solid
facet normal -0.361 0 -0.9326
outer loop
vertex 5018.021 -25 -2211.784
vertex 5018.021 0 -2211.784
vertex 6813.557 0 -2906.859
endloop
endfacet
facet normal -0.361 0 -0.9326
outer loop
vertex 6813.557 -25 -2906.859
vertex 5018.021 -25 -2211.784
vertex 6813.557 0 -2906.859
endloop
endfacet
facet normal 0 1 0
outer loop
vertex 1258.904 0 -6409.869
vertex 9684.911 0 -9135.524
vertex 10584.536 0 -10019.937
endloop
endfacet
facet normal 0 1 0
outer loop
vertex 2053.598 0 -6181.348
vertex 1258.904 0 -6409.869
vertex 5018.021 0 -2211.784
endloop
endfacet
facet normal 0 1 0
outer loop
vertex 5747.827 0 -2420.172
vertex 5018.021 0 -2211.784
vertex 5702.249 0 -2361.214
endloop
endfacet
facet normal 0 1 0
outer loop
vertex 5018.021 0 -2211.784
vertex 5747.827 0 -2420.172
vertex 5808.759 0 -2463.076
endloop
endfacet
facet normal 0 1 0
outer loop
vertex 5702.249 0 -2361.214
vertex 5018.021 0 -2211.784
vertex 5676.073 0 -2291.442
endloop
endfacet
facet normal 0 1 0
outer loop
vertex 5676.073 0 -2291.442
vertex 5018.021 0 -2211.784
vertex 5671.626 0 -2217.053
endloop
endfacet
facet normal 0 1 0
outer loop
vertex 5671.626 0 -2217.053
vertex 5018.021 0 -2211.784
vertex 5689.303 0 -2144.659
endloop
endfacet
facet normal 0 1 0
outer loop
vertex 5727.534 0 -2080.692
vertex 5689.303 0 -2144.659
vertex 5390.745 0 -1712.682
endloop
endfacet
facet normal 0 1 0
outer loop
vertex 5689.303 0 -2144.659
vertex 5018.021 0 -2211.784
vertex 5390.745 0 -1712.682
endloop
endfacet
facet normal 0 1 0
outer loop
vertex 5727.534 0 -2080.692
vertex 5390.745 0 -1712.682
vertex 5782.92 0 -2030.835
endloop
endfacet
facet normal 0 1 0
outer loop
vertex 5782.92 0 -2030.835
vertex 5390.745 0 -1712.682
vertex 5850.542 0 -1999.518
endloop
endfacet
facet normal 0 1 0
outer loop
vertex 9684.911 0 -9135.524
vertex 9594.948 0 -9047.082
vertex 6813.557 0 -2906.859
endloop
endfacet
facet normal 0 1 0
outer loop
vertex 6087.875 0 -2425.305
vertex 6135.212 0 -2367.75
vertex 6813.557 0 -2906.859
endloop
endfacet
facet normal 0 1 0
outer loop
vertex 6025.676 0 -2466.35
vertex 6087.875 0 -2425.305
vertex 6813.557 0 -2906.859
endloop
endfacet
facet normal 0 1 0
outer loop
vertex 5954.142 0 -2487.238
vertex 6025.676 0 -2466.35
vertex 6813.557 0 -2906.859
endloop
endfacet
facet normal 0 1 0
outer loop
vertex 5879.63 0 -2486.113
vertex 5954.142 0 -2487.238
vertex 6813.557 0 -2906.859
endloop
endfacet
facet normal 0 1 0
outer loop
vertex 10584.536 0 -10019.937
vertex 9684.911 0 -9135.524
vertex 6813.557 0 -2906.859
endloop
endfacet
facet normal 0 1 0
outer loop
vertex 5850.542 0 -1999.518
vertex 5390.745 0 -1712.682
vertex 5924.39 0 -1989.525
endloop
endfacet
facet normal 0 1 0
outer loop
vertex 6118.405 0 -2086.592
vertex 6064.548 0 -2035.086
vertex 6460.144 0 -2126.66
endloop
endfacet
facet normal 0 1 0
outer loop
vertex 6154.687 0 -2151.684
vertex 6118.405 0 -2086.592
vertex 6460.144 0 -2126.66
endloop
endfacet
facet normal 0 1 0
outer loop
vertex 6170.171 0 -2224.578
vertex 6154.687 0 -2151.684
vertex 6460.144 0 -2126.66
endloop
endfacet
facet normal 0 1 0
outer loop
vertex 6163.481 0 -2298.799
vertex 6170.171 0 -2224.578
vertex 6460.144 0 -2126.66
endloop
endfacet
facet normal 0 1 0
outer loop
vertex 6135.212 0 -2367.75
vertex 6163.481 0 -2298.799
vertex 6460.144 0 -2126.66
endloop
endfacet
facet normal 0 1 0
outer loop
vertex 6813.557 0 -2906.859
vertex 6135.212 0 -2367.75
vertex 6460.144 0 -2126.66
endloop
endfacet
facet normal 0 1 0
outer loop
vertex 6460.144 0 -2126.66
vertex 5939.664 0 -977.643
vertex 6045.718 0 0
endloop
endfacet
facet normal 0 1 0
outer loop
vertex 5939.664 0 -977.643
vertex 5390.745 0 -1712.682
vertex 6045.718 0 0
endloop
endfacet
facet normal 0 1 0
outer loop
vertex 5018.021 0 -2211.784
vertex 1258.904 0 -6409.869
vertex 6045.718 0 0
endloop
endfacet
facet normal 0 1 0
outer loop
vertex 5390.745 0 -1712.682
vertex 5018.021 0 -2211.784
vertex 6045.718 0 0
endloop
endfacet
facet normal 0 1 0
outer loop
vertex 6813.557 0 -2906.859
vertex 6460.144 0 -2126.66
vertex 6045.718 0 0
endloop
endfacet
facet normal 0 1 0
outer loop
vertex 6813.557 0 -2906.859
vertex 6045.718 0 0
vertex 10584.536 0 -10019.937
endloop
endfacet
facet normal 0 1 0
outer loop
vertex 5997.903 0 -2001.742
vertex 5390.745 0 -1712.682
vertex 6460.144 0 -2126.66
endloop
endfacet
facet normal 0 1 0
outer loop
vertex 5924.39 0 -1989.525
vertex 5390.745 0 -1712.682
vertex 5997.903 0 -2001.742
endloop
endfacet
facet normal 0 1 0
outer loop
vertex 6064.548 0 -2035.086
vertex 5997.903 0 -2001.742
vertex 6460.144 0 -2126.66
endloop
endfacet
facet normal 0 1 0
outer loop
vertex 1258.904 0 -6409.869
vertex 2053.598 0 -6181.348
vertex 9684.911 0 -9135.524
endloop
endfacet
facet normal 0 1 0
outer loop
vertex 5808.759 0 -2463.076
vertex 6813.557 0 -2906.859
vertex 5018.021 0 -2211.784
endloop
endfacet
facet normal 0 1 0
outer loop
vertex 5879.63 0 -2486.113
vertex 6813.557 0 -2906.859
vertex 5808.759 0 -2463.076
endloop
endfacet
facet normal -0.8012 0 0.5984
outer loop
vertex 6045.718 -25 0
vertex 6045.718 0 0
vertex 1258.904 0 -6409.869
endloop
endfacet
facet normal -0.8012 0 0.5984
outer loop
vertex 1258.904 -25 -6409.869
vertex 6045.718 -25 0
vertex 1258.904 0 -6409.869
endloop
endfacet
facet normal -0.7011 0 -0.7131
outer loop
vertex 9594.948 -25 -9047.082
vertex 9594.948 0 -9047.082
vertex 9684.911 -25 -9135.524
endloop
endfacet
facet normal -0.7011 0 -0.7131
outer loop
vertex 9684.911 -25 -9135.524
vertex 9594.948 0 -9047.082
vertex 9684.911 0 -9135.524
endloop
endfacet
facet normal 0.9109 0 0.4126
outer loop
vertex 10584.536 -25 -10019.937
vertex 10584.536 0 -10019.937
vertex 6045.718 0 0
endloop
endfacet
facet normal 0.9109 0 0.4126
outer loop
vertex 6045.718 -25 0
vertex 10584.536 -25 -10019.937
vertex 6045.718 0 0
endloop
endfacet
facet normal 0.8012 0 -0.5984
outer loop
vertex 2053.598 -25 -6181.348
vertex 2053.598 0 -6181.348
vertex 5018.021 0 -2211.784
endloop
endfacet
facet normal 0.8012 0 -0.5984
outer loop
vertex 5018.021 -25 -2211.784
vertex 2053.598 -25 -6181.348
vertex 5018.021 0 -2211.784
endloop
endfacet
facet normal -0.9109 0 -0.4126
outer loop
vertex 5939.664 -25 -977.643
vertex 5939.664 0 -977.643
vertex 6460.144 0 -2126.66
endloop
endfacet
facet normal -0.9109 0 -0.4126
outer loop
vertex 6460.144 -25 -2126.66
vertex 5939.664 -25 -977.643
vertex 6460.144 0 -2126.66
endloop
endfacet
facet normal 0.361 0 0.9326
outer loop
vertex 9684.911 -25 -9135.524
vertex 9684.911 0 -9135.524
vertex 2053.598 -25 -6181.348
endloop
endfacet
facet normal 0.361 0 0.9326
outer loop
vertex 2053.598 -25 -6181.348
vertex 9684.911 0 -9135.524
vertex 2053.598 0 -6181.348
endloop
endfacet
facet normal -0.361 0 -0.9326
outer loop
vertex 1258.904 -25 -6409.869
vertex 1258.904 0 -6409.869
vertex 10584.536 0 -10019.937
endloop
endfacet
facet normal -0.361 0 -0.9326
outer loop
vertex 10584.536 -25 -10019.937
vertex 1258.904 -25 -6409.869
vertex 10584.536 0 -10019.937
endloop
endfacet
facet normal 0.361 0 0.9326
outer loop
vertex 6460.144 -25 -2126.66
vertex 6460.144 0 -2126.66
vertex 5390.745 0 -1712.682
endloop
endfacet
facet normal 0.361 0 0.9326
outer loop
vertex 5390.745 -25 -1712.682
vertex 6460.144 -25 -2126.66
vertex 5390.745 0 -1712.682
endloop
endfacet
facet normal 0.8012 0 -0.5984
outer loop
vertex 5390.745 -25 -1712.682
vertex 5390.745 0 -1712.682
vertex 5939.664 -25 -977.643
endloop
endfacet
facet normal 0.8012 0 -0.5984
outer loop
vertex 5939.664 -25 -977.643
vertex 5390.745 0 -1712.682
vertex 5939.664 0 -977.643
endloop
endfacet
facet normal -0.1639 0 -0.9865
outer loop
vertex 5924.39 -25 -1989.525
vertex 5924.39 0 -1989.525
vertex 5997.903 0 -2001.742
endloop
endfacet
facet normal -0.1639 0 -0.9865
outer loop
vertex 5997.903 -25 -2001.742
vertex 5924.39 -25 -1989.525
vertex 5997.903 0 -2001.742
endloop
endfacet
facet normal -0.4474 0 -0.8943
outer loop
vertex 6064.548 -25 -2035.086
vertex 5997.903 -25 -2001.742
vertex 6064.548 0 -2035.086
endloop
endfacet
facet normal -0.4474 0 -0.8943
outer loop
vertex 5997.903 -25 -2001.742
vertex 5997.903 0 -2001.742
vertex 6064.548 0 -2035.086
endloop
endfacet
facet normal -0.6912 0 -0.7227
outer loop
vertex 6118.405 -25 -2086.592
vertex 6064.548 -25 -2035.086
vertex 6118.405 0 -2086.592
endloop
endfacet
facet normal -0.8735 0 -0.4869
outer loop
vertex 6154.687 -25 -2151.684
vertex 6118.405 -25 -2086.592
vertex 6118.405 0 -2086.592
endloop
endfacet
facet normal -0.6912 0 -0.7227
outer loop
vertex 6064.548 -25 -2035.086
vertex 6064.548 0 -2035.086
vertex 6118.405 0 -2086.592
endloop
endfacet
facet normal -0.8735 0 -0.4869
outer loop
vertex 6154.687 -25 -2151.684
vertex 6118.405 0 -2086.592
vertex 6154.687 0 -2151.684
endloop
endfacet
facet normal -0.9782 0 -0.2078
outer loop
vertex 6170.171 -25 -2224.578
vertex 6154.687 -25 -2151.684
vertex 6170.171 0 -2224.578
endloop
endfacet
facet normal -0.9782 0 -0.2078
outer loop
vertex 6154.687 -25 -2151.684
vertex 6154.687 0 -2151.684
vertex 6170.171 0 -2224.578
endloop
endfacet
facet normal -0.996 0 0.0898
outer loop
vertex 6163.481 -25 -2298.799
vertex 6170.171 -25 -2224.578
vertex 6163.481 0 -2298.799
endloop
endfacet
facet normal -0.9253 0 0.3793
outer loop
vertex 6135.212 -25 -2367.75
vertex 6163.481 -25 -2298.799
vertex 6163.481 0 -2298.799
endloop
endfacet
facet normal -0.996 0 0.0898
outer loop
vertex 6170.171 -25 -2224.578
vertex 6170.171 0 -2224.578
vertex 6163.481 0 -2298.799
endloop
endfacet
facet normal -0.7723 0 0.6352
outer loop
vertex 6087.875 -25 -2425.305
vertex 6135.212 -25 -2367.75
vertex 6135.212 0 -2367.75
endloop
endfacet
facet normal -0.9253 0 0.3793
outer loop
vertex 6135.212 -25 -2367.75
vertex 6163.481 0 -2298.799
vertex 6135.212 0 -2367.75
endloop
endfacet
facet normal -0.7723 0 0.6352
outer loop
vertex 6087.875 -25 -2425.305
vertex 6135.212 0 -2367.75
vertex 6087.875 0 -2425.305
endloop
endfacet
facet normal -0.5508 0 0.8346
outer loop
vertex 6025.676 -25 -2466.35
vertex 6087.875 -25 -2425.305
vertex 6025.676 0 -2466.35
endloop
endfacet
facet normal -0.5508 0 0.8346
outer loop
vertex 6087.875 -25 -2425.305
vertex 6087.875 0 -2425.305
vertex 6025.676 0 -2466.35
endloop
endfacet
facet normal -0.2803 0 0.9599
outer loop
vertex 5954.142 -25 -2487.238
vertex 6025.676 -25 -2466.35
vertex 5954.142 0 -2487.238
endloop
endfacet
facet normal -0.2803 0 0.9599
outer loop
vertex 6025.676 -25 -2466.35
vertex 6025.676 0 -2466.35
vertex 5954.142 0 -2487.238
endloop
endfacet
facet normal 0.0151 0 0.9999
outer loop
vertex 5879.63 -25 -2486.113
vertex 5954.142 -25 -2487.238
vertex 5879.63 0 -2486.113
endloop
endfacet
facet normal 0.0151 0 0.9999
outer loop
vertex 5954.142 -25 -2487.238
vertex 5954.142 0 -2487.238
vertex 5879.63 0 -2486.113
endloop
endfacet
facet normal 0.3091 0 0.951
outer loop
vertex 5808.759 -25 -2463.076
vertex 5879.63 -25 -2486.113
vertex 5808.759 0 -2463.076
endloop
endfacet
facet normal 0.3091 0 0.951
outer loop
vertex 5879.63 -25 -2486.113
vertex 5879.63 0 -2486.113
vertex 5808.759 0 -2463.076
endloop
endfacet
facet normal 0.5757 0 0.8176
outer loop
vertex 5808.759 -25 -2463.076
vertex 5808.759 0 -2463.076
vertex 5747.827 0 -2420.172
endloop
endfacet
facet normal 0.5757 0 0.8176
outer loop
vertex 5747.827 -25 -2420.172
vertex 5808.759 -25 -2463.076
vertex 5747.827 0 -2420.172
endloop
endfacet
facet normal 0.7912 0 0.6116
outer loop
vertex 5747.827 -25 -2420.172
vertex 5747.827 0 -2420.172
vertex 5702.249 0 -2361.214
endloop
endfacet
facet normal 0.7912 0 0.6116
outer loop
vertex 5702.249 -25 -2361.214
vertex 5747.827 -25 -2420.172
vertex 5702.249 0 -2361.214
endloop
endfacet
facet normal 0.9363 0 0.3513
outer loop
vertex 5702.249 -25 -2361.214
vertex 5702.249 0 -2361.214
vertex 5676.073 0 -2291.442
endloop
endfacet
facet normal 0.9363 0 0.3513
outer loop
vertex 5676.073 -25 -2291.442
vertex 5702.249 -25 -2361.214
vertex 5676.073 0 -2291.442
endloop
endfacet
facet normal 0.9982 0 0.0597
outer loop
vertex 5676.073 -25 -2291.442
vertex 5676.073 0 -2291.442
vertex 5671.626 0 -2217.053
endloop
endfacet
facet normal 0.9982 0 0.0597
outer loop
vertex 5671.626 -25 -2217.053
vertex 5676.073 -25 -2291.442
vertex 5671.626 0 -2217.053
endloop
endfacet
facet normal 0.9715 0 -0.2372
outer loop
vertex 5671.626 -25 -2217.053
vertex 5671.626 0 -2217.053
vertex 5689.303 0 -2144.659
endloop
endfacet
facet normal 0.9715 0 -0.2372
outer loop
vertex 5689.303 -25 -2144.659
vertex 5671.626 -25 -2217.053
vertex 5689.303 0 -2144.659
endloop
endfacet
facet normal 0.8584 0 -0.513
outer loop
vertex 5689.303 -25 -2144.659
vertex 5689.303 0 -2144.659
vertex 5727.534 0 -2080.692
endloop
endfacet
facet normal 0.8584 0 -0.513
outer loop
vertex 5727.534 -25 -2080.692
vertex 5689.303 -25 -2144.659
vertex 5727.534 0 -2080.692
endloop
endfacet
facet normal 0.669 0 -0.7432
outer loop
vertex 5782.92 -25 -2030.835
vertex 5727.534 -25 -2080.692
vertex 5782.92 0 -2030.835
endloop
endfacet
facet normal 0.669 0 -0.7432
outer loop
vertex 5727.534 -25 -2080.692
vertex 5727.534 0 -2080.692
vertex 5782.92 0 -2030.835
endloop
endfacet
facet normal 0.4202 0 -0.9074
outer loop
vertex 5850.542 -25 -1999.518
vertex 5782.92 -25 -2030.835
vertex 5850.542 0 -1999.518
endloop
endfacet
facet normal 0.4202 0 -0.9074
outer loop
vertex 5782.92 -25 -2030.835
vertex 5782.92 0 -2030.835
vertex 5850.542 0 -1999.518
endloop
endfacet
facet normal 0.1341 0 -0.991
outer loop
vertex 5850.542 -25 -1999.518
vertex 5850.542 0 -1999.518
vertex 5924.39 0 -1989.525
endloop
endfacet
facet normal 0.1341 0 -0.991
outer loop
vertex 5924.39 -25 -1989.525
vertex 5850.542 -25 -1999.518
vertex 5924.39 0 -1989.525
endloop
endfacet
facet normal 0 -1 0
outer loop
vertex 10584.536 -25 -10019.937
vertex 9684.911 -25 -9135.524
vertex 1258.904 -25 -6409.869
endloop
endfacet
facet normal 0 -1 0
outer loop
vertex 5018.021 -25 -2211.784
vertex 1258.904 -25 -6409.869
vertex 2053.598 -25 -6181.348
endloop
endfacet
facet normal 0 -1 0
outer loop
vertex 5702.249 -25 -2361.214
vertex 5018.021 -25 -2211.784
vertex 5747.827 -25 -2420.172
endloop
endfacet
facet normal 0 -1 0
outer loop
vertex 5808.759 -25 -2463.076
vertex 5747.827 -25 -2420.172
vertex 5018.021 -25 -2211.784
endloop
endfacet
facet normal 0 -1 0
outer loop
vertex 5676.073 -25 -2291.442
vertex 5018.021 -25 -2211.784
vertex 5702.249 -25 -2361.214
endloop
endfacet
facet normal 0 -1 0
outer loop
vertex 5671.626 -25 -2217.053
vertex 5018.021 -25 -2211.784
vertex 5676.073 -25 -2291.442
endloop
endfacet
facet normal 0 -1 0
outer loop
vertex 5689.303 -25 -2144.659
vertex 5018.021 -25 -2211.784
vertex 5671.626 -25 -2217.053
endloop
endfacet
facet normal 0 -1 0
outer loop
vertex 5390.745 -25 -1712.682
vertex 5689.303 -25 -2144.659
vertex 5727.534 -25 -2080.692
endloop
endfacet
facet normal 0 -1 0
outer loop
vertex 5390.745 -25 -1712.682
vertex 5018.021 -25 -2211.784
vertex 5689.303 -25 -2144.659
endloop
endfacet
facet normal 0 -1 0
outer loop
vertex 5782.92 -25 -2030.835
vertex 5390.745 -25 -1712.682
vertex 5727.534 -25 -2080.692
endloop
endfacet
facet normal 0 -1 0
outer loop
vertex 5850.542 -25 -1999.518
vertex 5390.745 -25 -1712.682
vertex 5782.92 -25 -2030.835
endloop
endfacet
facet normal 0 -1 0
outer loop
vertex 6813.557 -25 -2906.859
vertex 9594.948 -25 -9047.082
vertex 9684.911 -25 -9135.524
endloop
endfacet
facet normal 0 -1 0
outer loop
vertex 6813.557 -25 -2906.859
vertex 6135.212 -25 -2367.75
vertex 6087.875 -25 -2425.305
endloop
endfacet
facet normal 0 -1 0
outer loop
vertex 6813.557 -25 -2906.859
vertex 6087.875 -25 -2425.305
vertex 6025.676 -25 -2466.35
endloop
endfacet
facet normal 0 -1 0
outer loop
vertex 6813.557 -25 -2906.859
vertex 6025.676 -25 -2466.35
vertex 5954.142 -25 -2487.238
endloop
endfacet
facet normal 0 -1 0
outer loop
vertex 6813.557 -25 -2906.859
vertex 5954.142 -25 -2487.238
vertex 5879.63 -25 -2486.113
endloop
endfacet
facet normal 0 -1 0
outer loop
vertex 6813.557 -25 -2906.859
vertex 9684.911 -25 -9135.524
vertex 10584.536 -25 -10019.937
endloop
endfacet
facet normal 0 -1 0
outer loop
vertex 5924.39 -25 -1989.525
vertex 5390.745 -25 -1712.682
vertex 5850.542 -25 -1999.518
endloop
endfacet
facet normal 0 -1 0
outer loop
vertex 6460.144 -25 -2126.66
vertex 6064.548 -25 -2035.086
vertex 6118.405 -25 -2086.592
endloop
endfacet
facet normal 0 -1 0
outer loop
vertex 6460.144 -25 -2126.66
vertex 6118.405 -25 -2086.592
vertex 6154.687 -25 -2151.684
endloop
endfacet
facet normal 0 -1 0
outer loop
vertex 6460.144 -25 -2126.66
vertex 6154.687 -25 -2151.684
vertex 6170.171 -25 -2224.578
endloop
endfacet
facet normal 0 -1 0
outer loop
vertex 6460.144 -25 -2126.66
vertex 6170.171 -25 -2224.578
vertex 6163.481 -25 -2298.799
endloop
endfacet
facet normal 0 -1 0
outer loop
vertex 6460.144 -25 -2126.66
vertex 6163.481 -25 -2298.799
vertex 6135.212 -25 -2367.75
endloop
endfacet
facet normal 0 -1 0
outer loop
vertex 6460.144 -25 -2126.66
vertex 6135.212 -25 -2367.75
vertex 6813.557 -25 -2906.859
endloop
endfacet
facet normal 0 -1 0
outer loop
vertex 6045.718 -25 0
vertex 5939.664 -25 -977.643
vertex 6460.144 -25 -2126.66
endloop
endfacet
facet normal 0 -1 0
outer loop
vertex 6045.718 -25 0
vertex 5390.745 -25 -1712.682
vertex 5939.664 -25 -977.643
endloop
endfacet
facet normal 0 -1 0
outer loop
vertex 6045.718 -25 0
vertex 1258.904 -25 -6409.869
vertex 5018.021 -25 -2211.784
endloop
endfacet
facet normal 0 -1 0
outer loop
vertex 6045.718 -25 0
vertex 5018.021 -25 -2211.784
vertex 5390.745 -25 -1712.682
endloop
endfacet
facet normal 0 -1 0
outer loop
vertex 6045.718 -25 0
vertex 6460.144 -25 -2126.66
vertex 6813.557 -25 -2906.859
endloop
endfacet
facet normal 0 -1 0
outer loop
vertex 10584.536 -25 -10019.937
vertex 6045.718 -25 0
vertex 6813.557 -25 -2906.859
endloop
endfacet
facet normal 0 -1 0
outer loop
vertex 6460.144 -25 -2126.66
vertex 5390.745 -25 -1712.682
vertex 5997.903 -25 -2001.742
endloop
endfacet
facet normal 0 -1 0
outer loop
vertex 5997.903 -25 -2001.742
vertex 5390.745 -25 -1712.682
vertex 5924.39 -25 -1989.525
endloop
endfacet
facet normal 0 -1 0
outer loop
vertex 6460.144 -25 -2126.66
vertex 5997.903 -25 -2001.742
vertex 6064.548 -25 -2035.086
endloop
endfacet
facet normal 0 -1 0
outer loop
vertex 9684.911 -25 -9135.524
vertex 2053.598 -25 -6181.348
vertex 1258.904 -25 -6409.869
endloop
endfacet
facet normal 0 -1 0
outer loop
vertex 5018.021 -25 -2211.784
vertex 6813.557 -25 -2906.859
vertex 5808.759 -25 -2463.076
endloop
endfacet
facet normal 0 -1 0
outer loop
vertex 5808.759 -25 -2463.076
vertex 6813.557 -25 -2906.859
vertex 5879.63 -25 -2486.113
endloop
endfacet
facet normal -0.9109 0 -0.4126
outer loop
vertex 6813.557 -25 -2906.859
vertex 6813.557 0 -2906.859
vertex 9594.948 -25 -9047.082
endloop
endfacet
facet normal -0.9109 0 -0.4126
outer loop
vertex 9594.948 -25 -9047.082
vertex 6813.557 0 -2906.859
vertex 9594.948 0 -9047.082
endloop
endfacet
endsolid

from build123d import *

# Parameters (mm, degrees)
F1_DEPTH = 25


# Not quite as in the source:
# - a feature names something its author has since deleted; it is built from what else it names


with BuildPart() as f1:
    # F0 (on Front) → F1 (new body)
    with BuildSketch(Plane.XZ):
        Polygon((5704.0546409884, -457.5102814203), (3652.3110417295, -3204.934271635), (4012.161188687, -3558.6994219099), (5018.0213600066, -2211.7843558738), (5390.744898264, -1712.6822306881), (5939.6636085267, -977.6428067571), align=None)
        Polygon((6045.7178843911, 0), (5704.0546409884, -457.5102814203), (5939.6636085267, -977.6428067571), (6281.3268519294, -520.1325253368), align=None)
        Polygon((6281.3268519294, -520.1325253368), (5939.6636085267, -977.6428067571), (6460.143900134, -2126.6598891299), (6813.5573514414, -2906.8586771351), (7811.482530577, -5109.8874877281), (8315.1269391623, -5009.9683174769), align=None)
        Polygon((9684.9106265398, -9135.5237592666), (10290.0247845106, -9369.7709782828), (8315.1269391623, -5009.9683174769), (7811.482530577, -5109.8874877281), (9594.9480898004, -9047.0824716979), align=None)
        Polygon((9684.9106265398, -9135.5237592666), (10584.5359939335, -10019.9366349539), (10290.0247845106, -9369.7709782828), align=None)
        Polygon((9624.3992107427, -9112.099037365), (9918.9104201656, -9762.264694036), (10584.5359939335, -10019.9366349539), (9684.9106265398, -9135.5237592666), align=None)
        Polygon((1991.4778842829, -6264.5315683592), (1258.904199068, -6409.8685432701), (1742.9955254446, -6597.266318483), align=None)
        Polygon((1569.5071476159, -5993.9501056153), (1258.904199068, -6409.8685432701), (1991.4778842829, -6264.5315683592), (2053.5984739925, -6181.3478808282), align=None)
        Polygon((3652.3110417295, -3204.934271635), (1569.5071476159, -5993.9501056153), (2053.5984739925, -6181.3478808282), (4012.161188687, -3558.6994219099), align=None)
        Polygon((1991.4778842829, -6264.5315683592), (1742.9955254446, -6597.266318483), (9918.9104201656, -9762.264694036), (9624.3992107427, -9112.099037365), (2174.6213055867, -6228.1973246315), align=None)
        Polygon((2053.5984739925, -6181.3478808282), (1991.4778842829, -6264.5315683592), (2174.6213055866, -6228.1973246315), align=None)
        with BuildLine():
            Line((5390.744898264, -1712.6822306881), (5018.0213600066, -2211.7843558738))
            Line((5018.0213600066, -2211.7843558738), (5915.789355724, -2559.3215165045))
            Line((5915.789355724, -2559.3215165045), (5916.8437449333, -2489.467813527))
            ThreePointArc((5916.8437449333, -2489.467813527), (5670.6453521413, -2235.7231556785), (5924.3900099897, -1989.5247628865))
            Line((5924.3900099897, -1989.5247628865), (5925.444399199, -1919.671059909))
            Line((5925.444399199, -1919.671059909), (5390.744898264, -1712.6822306881))
        make_face()
        with BuildLine():
            Line((6813.5573514414, -2906.8586771351), (6460.143900134, -2126.6598891299))
            Line((6460.143900134, -2126.6598891299), (5925.444399199, -1919.671059909))
            Line((5925.444399199, -1919.671059909), (5924.3900099897, -1989.5247628865))
            ThreePointArc((5924.3900099897, -1989.5247628865), (6098.7225808122, -2064.058668427), (6170.6168774615, -2239.4962882067))
            ThreePointArc((6170.6168774615, -2239.4962882067), (6096.0544972412, -2417.6019915574), (5916.8437449333, -2489.467813527))
            Line((5916.8437449333, -2489.467813527), (5915.789355724, -2559.3215165045))
            Line((5915.789355724, -2559.3215165045), (6813.5573514414, -2906.8586771351))
        make_face()
    extrude(amount=F1_DEPTH)


solid = f1.part
